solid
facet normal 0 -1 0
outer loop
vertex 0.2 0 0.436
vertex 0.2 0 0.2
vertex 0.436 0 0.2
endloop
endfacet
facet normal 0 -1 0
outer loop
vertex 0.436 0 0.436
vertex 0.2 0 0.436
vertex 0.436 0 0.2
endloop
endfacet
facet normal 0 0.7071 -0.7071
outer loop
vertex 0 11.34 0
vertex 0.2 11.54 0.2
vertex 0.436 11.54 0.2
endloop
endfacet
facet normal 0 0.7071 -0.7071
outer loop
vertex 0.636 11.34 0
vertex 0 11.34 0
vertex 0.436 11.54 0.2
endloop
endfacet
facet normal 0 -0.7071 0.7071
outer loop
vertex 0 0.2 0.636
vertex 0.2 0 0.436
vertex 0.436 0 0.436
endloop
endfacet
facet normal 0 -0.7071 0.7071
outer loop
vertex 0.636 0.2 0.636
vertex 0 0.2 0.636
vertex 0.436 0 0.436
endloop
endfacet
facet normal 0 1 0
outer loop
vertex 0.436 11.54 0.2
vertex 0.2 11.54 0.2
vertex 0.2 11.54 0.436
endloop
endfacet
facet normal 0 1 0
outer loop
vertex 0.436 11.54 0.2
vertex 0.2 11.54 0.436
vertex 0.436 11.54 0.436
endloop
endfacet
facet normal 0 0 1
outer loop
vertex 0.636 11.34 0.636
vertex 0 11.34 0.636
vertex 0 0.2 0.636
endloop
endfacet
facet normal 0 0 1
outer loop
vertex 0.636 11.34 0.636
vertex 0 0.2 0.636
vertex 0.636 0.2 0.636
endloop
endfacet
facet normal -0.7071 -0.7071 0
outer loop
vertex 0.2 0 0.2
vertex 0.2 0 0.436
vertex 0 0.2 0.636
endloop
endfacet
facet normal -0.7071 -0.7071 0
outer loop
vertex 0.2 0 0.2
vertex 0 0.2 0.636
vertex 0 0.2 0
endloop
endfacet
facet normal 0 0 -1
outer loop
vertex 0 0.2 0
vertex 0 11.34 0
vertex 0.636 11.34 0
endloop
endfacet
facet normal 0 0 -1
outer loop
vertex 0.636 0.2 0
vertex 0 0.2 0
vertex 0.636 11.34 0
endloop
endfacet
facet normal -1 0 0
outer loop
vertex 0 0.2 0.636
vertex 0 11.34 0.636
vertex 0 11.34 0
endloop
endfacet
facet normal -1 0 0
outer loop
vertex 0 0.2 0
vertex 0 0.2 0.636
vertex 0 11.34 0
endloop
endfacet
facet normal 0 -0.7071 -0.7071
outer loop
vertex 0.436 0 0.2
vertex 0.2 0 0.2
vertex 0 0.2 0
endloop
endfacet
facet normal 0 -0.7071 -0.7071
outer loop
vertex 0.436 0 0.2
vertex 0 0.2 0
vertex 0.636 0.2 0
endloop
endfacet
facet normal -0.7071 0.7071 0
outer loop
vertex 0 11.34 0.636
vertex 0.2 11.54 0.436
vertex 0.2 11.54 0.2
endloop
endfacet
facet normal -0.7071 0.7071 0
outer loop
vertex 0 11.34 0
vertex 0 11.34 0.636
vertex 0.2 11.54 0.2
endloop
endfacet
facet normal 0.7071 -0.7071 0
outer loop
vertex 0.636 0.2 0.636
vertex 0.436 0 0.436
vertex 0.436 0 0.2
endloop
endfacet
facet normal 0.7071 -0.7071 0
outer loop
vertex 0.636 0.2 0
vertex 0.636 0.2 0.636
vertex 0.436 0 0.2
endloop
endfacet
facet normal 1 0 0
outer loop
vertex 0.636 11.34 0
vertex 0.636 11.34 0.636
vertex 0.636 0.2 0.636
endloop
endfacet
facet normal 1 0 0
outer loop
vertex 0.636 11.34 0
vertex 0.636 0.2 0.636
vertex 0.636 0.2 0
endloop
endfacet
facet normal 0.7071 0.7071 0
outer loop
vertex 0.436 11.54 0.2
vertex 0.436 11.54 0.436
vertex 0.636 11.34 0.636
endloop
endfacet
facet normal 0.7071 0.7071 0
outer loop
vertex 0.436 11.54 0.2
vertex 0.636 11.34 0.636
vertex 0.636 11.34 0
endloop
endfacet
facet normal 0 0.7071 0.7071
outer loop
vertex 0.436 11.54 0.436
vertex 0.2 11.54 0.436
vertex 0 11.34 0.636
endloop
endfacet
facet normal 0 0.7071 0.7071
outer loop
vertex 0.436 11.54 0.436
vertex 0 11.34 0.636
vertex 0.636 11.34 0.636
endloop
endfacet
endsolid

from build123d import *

# Parameters (mm, degrees)
PIN_DRAWING_W = 0.636
PIN_DRAWING_H = 0.636
PIN_DEPTH     = 11.54
CHAMFER2_SIZE = 0.2


with BuildPart() as part:
    # pin_drawing → pin (new body)
    with BuildSketch(Plane(origin=(0, 0, 0), x_dir=(1, 0, 0), z_dir=(0, 1, 0))):
        with Locations((0.318, -0.318)):
            Rectangle(PIN_DRAWING_W, PIN_DRAWING_H)
    extrude(amount=PIN_DEPTH)

    # Chamfer2
    chamfer2_edges = [part.edges().sort_by_distance(p)[0] for p in [
        (0.636, 11.54, 0.318),
        (0.318, 11.54, 0),
        (0, 11.54, 0.318),
        (0.318, 0, 0),
        (0.636, 0, 0.318),
        (0.318, 0, 0.636),
        (0, 0, 0.318),
        (0.318, 11.54, 0.636),
    ]]
    chamfer(chamfer2_edges, length=CHAMFER2_SIZE)


solid = part.part
